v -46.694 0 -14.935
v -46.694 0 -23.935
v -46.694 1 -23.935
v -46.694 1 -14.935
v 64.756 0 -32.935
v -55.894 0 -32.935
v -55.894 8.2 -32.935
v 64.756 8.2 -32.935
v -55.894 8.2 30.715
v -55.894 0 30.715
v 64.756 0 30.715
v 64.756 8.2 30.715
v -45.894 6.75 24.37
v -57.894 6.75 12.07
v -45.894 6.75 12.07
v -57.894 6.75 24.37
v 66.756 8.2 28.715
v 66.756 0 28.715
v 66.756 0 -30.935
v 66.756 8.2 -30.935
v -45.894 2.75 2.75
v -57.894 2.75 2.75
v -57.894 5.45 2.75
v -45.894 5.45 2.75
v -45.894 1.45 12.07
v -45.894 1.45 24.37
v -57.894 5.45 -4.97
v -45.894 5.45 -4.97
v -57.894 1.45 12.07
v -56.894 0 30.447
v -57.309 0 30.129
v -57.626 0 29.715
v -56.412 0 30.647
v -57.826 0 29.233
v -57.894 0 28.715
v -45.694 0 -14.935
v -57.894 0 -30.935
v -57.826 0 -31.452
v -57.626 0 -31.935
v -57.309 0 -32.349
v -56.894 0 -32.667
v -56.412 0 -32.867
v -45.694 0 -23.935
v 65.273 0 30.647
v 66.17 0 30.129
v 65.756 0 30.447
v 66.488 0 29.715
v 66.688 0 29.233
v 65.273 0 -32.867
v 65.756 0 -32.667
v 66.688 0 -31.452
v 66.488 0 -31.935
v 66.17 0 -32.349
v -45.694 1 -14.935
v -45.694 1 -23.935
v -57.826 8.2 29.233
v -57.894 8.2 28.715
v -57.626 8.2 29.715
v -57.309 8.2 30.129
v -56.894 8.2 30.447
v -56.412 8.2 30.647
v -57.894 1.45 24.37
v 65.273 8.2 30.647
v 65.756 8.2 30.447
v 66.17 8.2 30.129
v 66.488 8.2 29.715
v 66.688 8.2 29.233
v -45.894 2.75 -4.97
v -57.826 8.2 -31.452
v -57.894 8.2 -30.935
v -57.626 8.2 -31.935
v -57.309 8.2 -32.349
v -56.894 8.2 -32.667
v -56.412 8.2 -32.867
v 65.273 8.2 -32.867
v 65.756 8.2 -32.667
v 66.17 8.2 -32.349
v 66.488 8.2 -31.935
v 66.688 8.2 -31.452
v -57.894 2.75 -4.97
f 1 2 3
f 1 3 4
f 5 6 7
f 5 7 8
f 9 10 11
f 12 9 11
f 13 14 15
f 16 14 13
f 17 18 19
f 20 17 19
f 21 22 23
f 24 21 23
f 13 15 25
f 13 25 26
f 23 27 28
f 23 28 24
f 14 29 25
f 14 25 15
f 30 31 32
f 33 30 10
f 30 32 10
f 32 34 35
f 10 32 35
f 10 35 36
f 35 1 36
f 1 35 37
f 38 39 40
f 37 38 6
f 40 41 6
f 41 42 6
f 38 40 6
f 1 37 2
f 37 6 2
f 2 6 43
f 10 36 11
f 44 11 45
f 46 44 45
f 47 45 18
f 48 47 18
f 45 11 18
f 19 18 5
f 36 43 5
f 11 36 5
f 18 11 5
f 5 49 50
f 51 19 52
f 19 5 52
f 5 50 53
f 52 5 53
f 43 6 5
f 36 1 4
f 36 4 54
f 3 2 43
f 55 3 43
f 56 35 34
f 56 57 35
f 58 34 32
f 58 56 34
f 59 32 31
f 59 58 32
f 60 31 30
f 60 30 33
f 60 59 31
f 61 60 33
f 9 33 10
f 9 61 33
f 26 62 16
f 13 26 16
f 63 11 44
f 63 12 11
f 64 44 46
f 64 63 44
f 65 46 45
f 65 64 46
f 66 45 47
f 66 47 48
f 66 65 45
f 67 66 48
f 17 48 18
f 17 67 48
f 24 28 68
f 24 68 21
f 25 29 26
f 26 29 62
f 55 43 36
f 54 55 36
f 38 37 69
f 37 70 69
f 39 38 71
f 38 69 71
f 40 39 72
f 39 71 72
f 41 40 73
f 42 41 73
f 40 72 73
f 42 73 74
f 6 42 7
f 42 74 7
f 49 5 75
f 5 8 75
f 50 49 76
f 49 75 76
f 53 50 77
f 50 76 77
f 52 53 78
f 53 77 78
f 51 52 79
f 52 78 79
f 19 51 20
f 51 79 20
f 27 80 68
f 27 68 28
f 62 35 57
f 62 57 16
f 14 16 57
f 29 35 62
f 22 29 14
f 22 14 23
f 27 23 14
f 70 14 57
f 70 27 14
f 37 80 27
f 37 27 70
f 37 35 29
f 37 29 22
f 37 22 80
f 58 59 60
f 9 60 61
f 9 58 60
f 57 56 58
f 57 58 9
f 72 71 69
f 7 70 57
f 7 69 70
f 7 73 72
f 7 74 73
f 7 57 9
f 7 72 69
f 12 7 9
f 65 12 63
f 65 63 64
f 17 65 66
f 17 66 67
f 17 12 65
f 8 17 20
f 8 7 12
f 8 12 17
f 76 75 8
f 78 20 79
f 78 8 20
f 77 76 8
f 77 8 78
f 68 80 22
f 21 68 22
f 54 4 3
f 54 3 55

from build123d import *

# Parameters (mm, degrees)
SKETCH1_W           = 124.65
SKETCH1_H           = 63.65
BOSS_EXTRUDE1_DEPTH = 8.2
SKETCH2_W           = 7.72
SKETCH2_H           = 2.7
SKETCH2_W_2         = 12.3
SKETCH2_H_2         = 5.3
CUT_EXTRUDE1_DEPTH  = 12
SKETCH3_W           = 1
SKETCH3_H           = 9
CUT_EXTRUDE2_DEPTH  = 1
FILLET1_R           = 2


with BuildPart() as part:
    # Sketch1 → Boss-Extrude1 (new body)
    with BuildSketch(Plane(origin=(0, 0, 0), x_dir=(1, 0, 0), z_dir=(0, 1, 0))):
        with Locations((4.430687204, 1.109774882)):
            Rectangle(SKETCH1_W, SKETCH1_H)
    extrude(amount=BOSS_EXTRUDE1_DEPTH)

    # Sketch2 → Cut-Extrude1 (cut)
    with BuildSketch(Plane.ZY.offset(57.894312796)):
        with Locations((-1.109774882, 4.1)):
            Rectangle(SKETCH2_W, SKETCH2_H)
        with Locations((18.220036332, 4.1)):
            Rectangle(SKETCH2_W_2, SKETCH2_H_2)
    extrude(amount=-CUT_EXTRUDE1_DEPTH, mode=Mode.SUBTRACT)

    # Sketch3 → Cut-Extrude2 (cut)
    with BuildSketch(Plane.XZ):
        with Locations((-46.194312796, -19.434774882)):
            Rectangle(SKETCH3_W, SKETCH3_H)
    extrude(amount=-CUT_EXTRUDE2_DEPTH, mode=Mode.SUBTRACT)

    # Fillet1
    fillet1_edges = [part.edges().sort_by_distance(p)[0] for p in [
        (-57.894312796, 4.1, -32.934774882),
        (66.755687204, 4.1, -32.934774882),
        (66.755687204, 4.1, 30.715225118),
        (-57.894312796, 4.1, 30.715225118),
    ]]
    fillet(fillet1_edges, radius=FILLET1_R)


solid = part.part
